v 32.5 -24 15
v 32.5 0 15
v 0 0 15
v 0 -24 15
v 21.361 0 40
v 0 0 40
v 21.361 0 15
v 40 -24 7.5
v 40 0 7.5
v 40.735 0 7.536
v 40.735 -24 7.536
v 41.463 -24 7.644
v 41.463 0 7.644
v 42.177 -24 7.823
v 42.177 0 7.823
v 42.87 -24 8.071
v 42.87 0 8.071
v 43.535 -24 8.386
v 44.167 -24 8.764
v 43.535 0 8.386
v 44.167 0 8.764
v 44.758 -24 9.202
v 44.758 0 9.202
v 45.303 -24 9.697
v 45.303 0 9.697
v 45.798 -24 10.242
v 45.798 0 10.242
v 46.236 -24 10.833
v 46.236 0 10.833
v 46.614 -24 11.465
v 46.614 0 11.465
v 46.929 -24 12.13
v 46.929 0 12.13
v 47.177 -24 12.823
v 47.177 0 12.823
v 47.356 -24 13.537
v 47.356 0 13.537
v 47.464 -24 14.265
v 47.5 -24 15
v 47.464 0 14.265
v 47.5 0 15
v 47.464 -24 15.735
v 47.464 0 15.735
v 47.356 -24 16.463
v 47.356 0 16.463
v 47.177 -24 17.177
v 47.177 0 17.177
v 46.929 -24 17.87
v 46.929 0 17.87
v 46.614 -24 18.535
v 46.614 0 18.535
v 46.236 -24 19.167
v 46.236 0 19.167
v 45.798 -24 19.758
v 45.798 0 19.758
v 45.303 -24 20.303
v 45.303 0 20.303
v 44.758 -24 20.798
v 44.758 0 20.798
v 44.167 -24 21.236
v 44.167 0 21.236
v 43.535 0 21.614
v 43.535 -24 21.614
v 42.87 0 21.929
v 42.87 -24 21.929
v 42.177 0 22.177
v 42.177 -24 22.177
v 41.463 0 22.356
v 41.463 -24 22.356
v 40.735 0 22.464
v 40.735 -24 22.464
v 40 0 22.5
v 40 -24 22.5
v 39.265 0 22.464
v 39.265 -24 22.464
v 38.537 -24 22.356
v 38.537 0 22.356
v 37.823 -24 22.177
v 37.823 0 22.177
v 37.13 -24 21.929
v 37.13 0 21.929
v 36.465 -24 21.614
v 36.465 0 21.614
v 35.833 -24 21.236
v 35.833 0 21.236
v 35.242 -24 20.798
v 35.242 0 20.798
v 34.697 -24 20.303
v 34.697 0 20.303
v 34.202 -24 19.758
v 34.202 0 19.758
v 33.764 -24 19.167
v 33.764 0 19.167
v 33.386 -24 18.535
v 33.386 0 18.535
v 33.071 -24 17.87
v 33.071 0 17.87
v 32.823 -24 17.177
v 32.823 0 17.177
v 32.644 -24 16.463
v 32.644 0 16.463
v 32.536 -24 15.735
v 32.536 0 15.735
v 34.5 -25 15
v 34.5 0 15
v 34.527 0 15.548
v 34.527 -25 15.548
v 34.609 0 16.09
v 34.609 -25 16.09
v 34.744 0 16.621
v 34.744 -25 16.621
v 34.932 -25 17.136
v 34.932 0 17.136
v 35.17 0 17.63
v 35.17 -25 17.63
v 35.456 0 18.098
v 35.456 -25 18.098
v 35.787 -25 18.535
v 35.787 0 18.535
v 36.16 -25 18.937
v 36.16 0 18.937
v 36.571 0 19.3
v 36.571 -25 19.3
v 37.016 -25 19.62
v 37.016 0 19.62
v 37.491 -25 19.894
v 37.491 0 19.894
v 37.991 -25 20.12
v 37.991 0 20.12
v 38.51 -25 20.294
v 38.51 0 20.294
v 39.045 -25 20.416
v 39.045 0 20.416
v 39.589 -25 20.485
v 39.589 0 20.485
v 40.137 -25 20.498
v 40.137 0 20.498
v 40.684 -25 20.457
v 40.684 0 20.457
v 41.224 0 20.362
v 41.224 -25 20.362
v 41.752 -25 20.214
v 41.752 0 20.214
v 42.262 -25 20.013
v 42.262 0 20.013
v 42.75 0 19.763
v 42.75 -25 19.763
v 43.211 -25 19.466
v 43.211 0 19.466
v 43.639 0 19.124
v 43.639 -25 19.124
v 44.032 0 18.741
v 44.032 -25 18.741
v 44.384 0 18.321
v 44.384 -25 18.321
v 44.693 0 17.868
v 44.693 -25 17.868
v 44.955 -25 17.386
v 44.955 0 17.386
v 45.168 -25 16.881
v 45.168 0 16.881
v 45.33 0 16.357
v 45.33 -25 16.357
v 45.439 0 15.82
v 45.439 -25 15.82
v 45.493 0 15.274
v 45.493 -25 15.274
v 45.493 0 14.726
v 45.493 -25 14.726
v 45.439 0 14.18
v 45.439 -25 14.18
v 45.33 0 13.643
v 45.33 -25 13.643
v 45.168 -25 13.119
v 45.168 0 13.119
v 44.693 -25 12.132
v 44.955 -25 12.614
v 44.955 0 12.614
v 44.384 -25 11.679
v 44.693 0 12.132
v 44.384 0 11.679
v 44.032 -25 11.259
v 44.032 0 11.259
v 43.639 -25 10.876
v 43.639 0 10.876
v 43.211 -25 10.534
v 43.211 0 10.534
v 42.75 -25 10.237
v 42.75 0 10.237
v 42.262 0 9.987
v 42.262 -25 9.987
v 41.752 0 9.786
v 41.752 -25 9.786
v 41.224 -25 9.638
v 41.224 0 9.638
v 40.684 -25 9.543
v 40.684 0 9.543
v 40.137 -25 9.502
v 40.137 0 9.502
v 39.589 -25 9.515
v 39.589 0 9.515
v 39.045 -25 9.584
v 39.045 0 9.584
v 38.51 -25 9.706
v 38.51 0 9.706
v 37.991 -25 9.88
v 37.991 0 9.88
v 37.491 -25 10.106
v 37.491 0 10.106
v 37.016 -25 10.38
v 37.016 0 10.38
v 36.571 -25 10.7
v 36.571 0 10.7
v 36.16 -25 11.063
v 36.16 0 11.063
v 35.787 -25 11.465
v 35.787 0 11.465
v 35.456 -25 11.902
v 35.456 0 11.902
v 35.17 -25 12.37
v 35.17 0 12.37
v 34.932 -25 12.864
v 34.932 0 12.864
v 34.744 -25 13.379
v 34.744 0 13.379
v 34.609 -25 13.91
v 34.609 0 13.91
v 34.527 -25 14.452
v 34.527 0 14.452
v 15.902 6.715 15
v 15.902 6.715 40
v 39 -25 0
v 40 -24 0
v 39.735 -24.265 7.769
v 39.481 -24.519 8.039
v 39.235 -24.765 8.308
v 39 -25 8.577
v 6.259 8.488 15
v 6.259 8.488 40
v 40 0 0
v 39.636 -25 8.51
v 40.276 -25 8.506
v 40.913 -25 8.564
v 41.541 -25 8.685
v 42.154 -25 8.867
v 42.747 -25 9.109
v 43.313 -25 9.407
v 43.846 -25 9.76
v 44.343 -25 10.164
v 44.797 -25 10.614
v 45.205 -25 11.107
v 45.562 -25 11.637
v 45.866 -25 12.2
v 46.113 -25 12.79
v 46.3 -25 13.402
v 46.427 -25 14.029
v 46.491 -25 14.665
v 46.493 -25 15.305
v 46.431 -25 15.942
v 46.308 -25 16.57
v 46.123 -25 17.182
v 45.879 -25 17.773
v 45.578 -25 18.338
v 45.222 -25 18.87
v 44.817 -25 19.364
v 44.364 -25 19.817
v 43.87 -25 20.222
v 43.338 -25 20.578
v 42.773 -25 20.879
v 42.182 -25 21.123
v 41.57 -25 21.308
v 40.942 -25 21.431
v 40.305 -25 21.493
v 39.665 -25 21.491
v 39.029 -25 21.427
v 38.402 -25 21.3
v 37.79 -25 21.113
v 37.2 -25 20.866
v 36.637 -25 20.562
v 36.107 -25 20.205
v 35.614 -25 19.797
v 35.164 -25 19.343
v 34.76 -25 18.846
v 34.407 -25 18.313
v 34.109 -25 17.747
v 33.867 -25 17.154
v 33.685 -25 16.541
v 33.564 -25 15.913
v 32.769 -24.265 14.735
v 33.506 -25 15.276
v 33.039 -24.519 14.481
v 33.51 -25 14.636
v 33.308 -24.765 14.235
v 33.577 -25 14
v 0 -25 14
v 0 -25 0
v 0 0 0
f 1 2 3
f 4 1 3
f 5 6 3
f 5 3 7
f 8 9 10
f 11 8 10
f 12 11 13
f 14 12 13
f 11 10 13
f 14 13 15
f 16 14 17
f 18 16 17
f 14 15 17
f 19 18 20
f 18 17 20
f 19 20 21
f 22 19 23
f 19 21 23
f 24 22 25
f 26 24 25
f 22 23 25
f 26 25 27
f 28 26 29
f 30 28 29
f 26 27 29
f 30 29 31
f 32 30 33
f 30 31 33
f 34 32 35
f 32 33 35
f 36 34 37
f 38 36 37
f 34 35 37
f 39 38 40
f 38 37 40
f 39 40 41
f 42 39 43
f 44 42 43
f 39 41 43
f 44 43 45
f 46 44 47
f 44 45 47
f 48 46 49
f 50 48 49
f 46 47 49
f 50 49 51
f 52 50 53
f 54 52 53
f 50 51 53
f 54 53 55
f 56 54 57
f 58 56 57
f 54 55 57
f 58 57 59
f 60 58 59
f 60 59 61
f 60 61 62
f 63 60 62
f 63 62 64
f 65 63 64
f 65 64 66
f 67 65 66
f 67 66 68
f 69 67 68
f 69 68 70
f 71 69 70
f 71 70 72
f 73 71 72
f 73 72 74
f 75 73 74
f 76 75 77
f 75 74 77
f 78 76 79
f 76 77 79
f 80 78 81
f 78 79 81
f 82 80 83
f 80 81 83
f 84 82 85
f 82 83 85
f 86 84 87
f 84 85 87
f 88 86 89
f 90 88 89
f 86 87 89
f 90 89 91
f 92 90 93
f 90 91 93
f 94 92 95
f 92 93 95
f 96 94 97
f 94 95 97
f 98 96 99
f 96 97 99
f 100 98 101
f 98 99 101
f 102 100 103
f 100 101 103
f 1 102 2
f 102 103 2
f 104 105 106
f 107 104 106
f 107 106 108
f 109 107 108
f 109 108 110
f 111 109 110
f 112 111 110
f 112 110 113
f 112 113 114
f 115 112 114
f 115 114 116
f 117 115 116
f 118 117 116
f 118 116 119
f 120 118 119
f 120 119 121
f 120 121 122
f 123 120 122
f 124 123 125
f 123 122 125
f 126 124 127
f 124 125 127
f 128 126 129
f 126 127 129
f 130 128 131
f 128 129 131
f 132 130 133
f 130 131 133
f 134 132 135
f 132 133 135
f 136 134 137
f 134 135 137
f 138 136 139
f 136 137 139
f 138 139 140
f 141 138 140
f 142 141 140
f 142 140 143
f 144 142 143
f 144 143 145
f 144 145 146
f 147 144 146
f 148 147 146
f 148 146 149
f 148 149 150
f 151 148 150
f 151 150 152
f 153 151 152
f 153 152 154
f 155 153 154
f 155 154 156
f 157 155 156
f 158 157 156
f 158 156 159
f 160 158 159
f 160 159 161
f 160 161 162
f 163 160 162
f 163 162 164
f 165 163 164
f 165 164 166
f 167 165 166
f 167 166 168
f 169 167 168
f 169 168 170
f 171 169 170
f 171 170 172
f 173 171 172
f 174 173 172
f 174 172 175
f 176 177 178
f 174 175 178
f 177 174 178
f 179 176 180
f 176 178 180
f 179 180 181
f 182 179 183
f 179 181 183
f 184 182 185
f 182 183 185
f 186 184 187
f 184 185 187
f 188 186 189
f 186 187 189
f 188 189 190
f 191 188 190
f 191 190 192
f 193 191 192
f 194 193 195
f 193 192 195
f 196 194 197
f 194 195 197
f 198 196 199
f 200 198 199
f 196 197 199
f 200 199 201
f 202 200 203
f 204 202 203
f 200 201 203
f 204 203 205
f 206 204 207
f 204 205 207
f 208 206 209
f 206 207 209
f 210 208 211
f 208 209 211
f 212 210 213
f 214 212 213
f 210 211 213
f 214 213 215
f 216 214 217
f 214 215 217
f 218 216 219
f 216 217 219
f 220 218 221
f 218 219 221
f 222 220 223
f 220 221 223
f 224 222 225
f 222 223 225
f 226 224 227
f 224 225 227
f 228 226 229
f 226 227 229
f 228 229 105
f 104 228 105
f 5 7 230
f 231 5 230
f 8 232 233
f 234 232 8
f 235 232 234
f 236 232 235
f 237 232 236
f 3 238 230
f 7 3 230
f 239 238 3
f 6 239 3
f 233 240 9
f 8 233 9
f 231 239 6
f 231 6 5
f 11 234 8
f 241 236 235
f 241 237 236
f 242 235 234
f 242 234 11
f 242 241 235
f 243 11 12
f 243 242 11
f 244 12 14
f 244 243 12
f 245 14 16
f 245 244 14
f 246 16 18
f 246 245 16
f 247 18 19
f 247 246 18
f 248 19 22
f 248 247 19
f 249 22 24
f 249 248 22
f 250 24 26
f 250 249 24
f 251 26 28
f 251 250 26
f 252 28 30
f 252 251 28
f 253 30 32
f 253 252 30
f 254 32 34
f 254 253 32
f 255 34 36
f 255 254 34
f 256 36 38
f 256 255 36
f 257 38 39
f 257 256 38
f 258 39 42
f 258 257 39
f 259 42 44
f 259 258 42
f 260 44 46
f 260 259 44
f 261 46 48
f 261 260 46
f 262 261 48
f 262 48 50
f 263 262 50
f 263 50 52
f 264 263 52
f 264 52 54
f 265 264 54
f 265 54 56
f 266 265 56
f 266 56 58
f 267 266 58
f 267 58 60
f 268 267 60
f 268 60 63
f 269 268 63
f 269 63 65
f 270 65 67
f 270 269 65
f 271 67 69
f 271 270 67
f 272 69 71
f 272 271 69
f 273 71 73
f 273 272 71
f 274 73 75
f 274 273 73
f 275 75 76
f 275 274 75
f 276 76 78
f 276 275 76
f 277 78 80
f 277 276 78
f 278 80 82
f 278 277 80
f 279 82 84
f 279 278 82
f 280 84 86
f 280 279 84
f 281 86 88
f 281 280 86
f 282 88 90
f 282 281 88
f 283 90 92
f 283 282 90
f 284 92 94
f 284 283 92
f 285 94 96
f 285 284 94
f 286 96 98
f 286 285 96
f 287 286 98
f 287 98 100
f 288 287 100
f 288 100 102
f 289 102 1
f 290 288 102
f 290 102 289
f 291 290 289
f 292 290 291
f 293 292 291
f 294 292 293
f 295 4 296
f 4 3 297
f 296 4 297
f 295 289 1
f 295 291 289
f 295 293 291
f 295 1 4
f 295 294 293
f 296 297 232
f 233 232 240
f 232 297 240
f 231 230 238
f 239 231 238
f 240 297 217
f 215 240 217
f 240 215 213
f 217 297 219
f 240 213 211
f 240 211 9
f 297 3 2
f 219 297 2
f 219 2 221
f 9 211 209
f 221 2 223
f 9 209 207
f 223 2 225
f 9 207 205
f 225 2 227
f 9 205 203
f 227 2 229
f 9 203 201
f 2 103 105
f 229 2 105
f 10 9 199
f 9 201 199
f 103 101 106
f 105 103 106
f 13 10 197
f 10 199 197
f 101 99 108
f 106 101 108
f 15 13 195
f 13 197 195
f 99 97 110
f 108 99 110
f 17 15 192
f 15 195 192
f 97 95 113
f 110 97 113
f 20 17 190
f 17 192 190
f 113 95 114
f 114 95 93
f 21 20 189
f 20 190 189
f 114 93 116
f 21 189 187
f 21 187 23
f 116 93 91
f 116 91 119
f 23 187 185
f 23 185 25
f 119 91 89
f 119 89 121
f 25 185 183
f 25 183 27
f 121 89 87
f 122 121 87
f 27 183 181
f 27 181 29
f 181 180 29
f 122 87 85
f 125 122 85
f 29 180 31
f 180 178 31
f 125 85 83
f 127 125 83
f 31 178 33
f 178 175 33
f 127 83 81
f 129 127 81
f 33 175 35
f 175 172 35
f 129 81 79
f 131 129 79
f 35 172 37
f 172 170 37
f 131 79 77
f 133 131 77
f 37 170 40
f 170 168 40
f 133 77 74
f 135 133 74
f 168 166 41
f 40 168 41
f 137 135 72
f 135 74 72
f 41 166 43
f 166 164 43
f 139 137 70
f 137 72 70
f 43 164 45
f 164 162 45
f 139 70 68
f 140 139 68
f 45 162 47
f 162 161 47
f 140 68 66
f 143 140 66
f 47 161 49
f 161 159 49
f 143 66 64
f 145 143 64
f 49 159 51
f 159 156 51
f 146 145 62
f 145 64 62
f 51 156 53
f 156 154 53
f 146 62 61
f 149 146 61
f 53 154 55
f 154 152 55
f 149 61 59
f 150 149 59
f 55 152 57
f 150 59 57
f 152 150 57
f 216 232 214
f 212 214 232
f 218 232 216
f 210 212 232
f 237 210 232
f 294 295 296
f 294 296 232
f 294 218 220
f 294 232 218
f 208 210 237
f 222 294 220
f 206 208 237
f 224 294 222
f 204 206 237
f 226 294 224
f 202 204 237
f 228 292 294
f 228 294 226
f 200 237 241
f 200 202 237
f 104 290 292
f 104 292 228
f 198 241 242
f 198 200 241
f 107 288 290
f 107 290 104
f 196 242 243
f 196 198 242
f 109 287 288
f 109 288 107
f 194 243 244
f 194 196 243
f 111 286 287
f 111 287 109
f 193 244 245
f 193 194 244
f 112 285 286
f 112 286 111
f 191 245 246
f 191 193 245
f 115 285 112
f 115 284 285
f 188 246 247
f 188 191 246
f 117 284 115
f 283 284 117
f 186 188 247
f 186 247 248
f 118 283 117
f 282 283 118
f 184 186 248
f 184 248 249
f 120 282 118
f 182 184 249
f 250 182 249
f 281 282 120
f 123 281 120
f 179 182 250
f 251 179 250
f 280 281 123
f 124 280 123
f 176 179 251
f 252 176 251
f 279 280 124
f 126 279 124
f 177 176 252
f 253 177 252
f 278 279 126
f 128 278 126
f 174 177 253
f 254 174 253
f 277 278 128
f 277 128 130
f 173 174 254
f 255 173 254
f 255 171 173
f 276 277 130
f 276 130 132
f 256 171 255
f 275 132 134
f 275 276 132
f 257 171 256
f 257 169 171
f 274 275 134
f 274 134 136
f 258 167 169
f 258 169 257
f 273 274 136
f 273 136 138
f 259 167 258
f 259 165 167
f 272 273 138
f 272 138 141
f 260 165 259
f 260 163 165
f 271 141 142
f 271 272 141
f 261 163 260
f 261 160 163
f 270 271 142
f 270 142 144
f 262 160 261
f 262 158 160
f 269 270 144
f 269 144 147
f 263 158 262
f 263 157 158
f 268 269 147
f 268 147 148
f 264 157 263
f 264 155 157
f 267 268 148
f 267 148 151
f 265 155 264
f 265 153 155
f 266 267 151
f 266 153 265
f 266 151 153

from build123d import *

# Parameters (mm, degrees)
F1_DEPTH = 25
F2_SIZE  = 1
F3_R     = 5.5
F4_DEPTH = 25.001
F6_DEPTH = 25


with BuildPart() as f1:
    # F0 (on Front) → F1 (new body)
    with BuildSketch(Plane.XZ):
        with BuildLine():
            Line((0, 15), (0, 0))
            Line((0, 0), (40, 0))
            Line((40, 0), (40, 7.5))
            ThreePointArc((40, 7.5), (34.6966991411, 9.6966991411), (32.5, 15))
            Line((32.5, 15), (0, 15))
        make_face()
        with BuildLine():
            ThreePointArc((32.5, 15), (34.6966991411, 9.6966991411), (40, 7.5))
            Line((40, 7.5), (40, 15))
            Line((40, 15), (32.5, 15))
        make_face()
        with BuildLine():
            Line((40, 15), (40, 7.5))
            ThreePointArc((40, 7.5), (45.3033008589, 9.6966991411), (47.5, 15))
            ThreePointArc((47.5, 15), (40, 22.5), (32.5, 15))
            Line((32.5, 15), (40, 15))
        make_face()
    extrude(amount=F1_DEPTH)

    # F2
    f2_edges = [f1.edges().sort_by_distance(p)[0] for p in [
        (16.25, -25, 15),
        (45.303301, -25, 20.303301),
        (40, -25, 3.75),
    ]]
    chamfer(f2_edges, length=F2_SIZE)

    # F3 (on face) → F4 (cut, through all)
    with BuildSketch(Plane(origin=(0, 0, 0), x_dir=(-1, 0, 0), z_dir=(0, 1, 0))):
        with Locations((-40, 15)):
            Circle(F3_R)
    extrude(amount=-F4_DEPTH, mode=Mode.SUBTRACT)


with BuildPart() as f6:
    # F5 (on face) → F6 (new body)
    with BuildSketch(Plane.XY.offset(15)):
        Polygon((6.2590348534, 8.4877051413), (0, 0), (21.3613715023, 0), (15.9018412232, 6.7151314579), align=None)
    extrude(amount=F6_DEPTH)


solid = Compound([f1.part, f6.part])
